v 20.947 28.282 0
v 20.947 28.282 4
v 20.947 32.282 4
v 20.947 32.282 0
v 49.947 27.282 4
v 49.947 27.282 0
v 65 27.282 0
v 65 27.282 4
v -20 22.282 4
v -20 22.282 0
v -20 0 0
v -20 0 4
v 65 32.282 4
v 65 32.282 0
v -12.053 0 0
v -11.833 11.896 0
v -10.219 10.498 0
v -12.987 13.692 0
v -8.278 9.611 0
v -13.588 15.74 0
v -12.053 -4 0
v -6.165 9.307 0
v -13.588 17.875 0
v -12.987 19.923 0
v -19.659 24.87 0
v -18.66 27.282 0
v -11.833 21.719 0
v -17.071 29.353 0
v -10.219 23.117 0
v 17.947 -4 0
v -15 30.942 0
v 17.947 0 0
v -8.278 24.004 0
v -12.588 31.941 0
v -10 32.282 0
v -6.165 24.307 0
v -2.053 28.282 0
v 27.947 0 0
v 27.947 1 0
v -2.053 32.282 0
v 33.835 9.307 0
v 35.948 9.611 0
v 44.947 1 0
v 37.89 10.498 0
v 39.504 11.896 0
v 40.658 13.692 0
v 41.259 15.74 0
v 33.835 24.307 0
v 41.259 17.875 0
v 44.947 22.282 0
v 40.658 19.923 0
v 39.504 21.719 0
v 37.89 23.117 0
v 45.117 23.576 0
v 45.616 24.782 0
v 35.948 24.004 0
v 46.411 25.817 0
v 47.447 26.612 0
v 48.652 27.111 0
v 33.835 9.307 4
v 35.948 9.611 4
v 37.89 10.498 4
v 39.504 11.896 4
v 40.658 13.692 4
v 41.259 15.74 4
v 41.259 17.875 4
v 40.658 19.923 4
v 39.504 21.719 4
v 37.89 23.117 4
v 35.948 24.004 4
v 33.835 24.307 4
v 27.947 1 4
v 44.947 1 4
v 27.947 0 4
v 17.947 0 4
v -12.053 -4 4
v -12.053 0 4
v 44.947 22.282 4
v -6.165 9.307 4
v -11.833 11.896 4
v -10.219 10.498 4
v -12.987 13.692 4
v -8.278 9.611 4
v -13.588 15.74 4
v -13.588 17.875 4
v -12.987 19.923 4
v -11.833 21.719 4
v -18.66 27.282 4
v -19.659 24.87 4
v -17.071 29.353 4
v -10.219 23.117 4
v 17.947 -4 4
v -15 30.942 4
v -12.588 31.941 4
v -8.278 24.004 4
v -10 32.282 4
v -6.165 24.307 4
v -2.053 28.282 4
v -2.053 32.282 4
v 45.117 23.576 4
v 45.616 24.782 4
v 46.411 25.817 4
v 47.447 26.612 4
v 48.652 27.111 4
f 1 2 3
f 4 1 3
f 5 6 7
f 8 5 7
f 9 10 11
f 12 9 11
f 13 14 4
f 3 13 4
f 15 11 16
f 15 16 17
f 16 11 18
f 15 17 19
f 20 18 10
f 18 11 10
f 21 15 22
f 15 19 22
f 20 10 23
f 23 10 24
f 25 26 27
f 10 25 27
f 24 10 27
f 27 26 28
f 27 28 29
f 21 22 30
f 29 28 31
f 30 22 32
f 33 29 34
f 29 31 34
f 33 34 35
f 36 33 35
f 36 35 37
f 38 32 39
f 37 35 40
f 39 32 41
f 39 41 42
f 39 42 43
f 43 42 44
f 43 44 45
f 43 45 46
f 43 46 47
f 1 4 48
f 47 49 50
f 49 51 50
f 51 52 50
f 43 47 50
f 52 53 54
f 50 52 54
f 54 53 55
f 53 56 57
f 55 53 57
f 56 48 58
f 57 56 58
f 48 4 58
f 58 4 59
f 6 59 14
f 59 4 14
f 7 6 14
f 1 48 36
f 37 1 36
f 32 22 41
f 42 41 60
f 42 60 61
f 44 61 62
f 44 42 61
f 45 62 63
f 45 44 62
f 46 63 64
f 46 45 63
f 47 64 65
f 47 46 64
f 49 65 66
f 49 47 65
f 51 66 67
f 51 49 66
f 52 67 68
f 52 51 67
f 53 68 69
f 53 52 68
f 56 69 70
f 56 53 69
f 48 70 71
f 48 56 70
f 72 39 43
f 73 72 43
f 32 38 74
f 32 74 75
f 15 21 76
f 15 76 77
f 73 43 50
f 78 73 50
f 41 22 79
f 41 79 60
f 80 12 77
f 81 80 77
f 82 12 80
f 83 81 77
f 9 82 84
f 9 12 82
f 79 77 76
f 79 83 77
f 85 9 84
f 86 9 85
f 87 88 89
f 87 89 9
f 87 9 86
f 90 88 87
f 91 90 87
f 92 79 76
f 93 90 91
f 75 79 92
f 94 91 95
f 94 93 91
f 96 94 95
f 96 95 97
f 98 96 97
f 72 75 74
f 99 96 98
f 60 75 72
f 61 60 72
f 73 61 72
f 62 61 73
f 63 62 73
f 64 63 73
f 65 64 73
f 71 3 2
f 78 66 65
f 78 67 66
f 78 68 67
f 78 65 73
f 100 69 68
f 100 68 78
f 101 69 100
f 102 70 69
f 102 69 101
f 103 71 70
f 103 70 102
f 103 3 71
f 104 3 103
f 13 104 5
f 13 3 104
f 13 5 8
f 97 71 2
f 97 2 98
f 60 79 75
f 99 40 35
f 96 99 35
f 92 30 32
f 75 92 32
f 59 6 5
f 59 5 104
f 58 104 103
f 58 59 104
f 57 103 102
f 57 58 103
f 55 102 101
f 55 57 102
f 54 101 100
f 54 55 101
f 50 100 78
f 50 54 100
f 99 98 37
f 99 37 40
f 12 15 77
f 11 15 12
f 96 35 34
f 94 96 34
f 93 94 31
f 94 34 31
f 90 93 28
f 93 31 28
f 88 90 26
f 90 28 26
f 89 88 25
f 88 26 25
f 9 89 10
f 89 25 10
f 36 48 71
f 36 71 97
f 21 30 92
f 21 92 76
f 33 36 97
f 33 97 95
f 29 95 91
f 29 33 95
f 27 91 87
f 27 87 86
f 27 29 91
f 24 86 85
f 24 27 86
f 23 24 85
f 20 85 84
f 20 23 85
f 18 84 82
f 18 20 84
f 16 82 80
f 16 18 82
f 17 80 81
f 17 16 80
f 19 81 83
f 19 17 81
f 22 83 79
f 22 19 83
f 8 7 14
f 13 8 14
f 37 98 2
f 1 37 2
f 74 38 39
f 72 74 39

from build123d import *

# Parameters (mm, degrees)
PAD_DEPTH    = 4
SKETCH_W     = 23
SKETCH_H     = 4
POCKET_DEPTH = 5


with BuildPart() as part:
    # Sketch002 → Pad (new body)
    with BuildSketch(Plane.XY):
        with BuildLine():
            Line((65, 32.281557), (-10, 32.281557))
            ThreePointArc((-10, 32.281557), (-17.071068, 29.352625), (-20, 22.281557))
            Line((-20, 22.281557), (-20, 0))
            Line((-12.053457, 0), (-20, 0))
            Line((-12.053457, -4), (-12.053457, 0))
            Line((17.946543, -4), (-12.053457, -4))
            Line((17.946543, -4), (17.946543, 0))
            Line((27.946543, 0), (17.946543, 0))
            Line((27.946543, 0), (27.946543, 1))
            Line((27.946543, 1), (44.946543, 1))
            Line((44.946543, 1), (44.946543, 22.281557))
            ThreePointArc((49.946543, 27.281557), (46.411009, 25.817091), (44.946543, 22.281557))
            Line((49.946543, 27.281557), (65, 27.281557))
            Line((65, 27.281557), (65, 32.281557))
        make_face()
        with BuildLine():
            ThreePointArc((-6.164606, 24.307305), (-13.664606, 16.807305), (-6.164606, 9.307305))
            Line((-6.164606, 9.307305), (33.835394, 9.307305))
            ThreePointArc((33.835394, 9.307305), (41.335394, 16.807305), (33.835394, 24.307305))
            Line((33.835394, 24.307305), (-6.164606, 24.307305))
        make_face(mode=Mode.SUBTRACT)
    extrude(amount=PAD_DEPTH)

    # Sketch (on Face20 of Pad) → Pocket (cut)
    with BuildSketch(Plane.XY.offset(4)):
        with Locations((9.446543, 30.281557)):
            Rectangle(SKETCH_W, SKETCH_H)
    extrude(amount=-POCKET_DEPTH, mode=Mode.SUBTRACT)


solid = part.part
